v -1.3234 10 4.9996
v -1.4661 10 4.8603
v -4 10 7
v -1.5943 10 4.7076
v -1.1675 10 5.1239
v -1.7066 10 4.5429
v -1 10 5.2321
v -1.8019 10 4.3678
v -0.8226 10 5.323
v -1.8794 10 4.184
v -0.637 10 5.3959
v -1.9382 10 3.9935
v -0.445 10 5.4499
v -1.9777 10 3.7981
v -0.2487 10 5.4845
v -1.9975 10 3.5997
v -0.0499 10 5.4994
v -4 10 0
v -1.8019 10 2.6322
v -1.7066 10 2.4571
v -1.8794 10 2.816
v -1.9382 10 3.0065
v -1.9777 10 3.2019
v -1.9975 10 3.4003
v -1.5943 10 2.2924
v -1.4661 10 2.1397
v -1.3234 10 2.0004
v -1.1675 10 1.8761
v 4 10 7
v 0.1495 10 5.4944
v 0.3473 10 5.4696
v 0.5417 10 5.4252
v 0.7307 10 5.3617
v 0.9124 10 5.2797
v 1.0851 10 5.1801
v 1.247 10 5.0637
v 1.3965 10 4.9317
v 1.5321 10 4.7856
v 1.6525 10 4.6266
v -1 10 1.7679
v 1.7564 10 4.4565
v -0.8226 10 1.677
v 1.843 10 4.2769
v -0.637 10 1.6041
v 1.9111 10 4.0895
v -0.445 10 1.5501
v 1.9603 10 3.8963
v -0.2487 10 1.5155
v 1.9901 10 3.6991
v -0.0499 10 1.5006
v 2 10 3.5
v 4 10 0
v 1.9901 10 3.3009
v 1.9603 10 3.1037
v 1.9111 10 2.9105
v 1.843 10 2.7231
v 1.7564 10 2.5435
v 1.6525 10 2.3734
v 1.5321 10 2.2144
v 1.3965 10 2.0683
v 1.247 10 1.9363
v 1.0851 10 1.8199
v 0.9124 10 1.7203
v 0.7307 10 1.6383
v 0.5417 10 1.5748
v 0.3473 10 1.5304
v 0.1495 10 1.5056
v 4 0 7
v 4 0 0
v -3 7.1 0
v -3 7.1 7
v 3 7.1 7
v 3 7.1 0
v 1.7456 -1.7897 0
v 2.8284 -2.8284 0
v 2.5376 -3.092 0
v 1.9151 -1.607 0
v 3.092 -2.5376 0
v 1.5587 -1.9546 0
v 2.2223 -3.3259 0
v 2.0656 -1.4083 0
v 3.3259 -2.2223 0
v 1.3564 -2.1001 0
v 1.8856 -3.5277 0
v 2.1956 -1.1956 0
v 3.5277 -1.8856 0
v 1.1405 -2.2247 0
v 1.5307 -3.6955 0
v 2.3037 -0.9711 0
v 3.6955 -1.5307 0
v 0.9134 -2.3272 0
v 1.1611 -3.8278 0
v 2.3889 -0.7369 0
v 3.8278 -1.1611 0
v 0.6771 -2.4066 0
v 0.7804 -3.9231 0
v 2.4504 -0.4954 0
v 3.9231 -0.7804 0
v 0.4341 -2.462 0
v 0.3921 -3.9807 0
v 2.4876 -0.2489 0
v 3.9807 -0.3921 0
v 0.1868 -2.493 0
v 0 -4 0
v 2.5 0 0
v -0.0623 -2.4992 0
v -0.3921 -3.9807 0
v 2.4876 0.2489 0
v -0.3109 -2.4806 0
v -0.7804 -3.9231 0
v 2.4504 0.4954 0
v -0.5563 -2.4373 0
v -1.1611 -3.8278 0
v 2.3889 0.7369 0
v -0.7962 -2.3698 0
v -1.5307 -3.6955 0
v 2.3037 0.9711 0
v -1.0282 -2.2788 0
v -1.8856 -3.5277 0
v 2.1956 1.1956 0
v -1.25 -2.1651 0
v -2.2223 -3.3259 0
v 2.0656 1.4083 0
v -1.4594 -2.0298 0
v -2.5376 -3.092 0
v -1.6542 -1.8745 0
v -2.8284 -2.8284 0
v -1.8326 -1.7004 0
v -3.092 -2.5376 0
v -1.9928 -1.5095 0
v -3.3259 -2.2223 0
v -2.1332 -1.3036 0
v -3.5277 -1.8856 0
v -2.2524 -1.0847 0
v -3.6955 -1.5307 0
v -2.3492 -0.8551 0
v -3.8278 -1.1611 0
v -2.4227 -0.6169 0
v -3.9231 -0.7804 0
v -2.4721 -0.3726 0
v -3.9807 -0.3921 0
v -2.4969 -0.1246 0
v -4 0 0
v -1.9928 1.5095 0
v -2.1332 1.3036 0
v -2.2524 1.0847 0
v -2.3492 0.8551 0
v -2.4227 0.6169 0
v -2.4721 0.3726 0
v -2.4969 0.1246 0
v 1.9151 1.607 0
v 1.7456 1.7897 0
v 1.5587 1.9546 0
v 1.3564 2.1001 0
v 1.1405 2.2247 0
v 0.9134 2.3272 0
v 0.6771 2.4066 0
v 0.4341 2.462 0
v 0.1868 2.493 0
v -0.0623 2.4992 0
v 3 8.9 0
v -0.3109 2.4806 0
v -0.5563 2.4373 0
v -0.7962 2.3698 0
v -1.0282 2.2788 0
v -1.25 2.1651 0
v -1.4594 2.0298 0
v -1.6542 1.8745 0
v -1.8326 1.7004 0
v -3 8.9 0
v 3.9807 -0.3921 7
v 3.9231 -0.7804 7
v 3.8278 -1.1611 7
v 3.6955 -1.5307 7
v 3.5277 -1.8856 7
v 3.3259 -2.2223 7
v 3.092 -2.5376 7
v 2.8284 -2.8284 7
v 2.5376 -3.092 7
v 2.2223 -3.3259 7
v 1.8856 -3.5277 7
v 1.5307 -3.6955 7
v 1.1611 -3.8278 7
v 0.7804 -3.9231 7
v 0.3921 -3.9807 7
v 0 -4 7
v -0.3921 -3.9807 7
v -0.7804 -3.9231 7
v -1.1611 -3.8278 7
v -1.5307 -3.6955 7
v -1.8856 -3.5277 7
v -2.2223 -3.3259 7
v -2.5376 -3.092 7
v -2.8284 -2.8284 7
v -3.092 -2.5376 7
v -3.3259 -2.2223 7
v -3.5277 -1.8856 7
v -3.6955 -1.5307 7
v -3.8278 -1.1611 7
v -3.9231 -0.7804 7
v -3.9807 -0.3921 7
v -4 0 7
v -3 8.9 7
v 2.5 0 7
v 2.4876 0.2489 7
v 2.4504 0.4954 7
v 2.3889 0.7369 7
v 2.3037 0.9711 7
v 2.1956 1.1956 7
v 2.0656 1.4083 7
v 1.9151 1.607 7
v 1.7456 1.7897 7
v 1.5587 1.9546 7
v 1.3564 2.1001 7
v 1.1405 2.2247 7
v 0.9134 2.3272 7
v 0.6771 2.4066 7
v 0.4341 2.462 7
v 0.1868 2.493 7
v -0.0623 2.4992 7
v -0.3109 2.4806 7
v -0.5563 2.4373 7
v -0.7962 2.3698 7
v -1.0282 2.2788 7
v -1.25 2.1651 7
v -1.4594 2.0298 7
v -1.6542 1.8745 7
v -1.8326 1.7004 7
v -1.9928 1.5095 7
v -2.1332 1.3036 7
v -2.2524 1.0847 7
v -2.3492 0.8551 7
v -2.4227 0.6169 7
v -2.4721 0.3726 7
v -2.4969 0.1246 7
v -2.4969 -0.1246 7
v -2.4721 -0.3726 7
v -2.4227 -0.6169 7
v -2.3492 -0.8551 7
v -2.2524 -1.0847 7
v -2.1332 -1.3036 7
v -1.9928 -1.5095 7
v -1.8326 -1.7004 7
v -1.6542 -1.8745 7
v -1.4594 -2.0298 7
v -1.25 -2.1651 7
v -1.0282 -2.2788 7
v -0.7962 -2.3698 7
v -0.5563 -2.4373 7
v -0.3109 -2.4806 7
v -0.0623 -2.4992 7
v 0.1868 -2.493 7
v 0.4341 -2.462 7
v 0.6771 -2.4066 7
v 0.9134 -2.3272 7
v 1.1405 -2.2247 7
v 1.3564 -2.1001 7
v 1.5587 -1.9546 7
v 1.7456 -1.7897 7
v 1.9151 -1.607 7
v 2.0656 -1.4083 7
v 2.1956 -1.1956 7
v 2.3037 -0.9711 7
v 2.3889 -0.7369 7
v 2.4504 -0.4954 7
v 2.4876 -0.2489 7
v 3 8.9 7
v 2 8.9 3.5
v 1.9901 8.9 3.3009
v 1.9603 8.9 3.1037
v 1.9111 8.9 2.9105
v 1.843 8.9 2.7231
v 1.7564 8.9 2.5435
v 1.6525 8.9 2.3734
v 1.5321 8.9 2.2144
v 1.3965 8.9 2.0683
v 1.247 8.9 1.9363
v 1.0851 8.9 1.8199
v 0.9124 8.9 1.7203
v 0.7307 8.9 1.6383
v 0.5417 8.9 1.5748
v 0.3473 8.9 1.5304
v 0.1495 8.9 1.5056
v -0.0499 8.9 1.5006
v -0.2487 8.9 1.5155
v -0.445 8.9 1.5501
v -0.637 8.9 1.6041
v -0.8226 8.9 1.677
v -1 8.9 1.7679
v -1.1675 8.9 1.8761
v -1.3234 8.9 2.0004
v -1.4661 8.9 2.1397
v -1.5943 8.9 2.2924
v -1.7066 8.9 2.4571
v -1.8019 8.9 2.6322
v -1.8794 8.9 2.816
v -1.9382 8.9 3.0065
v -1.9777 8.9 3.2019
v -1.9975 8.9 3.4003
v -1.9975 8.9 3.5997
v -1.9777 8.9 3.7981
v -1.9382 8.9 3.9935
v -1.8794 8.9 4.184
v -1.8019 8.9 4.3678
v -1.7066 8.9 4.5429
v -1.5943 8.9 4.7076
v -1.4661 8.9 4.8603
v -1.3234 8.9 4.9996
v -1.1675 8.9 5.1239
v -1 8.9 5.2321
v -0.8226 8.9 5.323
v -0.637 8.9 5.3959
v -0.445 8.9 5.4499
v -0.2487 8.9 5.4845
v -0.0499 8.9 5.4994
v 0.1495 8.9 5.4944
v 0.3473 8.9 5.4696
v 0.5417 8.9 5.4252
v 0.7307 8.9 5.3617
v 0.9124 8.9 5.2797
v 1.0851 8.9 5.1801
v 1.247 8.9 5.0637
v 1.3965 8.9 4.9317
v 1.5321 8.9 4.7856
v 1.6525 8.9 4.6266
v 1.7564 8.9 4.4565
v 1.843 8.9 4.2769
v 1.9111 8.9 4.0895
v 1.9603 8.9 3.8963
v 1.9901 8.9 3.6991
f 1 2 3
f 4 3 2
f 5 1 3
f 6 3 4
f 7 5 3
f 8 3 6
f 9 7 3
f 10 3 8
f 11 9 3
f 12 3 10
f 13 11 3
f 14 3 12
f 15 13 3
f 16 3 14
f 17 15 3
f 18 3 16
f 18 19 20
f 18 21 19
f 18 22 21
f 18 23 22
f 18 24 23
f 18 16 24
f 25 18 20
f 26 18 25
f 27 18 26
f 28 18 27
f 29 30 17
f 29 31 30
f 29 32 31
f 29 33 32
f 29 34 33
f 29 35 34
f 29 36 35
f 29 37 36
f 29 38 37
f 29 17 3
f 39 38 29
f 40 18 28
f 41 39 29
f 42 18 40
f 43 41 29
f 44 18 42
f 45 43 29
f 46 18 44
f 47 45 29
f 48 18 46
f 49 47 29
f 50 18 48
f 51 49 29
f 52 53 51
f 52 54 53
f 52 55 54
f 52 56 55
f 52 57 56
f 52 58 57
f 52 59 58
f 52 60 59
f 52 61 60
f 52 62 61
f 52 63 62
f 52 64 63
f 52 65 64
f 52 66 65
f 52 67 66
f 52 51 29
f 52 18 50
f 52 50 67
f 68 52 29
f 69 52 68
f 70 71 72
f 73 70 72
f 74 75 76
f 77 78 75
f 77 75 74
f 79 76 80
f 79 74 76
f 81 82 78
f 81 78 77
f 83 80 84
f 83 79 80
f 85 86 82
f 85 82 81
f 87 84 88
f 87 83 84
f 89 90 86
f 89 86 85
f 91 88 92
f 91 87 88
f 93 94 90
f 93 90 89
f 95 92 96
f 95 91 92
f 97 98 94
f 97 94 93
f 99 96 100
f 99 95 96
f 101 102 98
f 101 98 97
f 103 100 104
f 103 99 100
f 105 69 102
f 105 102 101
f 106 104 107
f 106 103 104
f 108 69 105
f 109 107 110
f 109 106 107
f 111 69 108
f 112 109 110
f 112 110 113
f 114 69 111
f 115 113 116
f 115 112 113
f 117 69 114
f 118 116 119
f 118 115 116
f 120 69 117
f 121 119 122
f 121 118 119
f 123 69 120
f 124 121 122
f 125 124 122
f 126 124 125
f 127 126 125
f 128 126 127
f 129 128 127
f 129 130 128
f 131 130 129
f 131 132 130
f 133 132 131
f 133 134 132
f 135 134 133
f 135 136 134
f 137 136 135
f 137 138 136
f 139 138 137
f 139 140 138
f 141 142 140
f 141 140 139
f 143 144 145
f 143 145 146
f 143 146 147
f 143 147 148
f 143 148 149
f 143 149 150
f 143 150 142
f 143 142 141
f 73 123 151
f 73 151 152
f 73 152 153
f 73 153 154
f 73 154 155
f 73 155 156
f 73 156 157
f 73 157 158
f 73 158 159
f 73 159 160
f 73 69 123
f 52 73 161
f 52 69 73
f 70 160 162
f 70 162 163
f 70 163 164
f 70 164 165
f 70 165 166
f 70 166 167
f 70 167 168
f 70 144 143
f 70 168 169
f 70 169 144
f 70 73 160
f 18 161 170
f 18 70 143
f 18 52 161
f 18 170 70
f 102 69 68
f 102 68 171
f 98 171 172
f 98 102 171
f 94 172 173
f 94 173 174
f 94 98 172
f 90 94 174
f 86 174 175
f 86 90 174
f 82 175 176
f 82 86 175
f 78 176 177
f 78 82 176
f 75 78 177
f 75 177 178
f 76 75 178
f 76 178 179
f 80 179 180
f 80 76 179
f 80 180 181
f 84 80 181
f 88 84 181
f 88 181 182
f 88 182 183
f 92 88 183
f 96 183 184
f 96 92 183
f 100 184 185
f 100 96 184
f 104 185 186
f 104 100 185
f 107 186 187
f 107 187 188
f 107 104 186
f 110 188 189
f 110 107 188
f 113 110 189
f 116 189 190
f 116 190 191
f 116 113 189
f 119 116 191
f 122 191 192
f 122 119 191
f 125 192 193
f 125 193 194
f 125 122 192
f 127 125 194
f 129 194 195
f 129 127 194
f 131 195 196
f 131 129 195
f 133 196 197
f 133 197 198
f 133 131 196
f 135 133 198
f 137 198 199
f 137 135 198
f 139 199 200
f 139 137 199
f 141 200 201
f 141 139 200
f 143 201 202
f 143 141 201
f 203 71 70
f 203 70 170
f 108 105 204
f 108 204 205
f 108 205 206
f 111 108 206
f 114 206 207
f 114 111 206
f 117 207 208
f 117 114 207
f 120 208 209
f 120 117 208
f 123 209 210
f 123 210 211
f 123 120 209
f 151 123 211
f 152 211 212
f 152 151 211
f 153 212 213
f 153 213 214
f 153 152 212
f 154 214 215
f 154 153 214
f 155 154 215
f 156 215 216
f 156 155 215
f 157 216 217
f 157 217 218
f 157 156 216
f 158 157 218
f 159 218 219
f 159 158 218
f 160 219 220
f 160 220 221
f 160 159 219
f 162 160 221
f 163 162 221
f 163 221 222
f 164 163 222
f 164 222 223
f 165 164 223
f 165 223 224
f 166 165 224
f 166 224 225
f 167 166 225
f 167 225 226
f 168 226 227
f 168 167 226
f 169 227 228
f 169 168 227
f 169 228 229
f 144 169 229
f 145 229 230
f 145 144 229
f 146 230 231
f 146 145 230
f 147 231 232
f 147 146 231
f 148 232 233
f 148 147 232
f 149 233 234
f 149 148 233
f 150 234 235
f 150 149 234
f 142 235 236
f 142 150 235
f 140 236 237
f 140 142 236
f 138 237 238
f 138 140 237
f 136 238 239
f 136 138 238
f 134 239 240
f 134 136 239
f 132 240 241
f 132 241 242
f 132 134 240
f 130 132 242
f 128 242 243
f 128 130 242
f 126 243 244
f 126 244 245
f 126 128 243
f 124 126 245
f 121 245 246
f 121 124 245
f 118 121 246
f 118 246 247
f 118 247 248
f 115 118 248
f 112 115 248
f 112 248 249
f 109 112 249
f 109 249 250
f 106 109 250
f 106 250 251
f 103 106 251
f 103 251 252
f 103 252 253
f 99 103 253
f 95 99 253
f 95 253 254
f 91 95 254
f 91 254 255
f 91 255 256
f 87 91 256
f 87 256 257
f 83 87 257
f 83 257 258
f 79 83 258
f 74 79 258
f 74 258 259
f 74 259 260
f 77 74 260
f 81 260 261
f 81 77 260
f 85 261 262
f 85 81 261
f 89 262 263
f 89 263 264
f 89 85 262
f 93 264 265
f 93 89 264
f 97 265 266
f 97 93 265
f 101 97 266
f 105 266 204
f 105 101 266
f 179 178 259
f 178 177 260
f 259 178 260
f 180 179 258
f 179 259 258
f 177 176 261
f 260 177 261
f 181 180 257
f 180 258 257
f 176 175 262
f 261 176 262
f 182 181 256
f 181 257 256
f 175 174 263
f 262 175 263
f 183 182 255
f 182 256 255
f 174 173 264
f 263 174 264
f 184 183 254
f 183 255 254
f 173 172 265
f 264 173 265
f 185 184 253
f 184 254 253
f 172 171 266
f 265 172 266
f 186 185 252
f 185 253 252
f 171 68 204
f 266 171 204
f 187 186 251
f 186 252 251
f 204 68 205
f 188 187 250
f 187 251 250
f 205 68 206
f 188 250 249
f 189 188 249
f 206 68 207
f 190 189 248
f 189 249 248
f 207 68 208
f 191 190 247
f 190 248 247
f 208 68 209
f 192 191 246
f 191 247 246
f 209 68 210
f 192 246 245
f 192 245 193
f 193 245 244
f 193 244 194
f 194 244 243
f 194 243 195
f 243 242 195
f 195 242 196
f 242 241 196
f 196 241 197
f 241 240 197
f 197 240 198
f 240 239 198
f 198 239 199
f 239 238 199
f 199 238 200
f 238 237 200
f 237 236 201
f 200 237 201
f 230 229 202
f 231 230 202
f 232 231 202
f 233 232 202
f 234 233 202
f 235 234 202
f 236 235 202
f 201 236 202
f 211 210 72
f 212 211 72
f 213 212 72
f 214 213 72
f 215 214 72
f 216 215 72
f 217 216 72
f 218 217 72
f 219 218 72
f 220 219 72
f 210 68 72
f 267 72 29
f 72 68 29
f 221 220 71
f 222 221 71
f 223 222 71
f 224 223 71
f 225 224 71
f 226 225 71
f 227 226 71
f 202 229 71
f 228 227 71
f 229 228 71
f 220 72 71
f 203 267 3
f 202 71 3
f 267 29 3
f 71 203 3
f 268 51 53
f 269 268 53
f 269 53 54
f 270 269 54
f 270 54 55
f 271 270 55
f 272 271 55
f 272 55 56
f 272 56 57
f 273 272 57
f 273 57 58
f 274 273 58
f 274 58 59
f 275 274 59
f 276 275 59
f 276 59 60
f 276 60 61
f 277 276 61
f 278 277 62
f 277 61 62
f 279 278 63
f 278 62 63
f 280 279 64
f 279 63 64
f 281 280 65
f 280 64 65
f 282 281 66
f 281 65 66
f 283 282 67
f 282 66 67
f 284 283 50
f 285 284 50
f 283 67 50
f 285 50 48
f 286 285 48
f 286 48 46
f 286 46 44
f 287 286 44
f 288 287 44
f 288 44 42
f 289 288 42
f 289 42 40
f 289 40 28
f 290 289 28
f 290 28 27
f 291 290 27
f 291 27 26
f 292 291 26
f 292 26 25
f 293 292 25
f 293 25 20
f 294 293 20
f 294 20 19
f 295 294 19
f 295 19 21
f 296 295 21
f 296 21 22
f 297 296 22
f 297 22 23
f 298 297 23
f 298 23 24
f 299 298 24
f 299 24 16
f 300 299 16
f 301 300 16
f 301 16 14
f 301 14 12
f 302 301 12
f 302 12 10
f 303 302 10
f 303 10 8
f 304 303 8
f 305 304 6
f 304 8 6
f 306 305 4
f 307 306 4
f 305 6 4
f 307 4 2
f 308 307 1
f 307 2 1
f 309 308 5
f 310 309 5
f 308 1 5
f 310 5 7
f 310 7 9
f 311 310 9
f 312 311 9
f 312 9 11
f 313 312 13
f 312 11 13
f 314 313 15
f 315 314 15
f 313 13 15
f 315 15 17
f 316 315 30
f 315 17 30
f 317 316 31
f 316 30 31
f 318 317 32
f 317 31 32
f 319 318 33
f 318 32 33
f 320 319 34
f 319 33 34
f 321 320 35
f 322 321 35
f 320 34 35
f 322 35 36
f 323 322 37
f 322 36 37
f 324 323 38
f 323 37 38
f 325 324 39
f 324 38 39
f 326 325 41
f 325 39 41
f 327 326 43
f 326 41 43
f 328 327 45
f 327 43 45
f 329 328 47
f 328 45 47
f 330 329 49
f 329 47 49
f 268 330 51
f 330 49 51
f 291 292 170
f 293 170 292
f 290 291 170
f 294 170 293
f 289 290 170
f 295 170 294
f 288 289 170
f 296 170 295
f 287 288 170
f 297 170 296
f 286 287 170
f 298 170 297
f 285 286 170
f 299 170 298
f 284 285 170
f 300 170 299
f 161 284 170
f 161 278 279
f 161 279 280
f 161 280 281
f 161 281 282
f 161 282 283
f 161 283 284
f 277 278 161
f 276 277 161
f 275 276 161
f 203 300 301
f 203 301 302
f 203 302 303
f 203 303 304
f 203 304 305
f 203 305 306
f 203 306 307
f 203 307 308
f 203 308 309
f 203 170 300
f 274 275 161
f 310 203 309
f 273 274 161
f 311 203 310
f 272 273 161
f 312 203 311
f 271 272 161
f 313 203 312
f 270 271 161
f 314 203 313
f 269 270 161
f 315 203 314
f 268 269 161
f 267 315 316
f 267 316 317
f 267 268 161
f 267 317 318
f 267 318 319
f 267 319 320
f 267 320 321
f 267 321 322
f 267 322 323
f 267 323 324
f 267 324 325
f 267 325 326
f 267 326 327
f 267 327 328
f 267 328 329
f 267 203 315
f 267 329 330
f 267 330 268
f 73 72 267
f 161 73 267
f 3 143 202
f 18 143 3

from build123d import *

# Parameters (mm, degrees)
SKETCH2_R           = 2.5
BOSS_EXTRUDE1_DEPTH = 7
SKETCH3_W           = 6
SKETCH3_H           = 1.8
CUT_EXTRUDE1_DEPTH  = 7
SKETCH4_R           = 2
CUT_EXTRUDE2_DEPTH  = 2


with BuildPart() as part:
    # Sketch2 → Boss-Extrude1 (new body)
    with BuildSketch(Plane.XY):
        with BuildLine():
            Line((-4, 0), (-4, 10))
            Line((-4, 10), (4, 10))
            Line((4, 10), (4, 0))
            ThreePointArc((4, 0), (0, -4), (-4, 0))
        make_face()
        Circle(SKETCH2_R, mode=Mode.SUBTRACT)
    extrude(amount=BOSS_EXTRUDE1_DEPTH)

    # Sketch3 → Cut-Extrude1 (cut)
    with BuildSketch(Plane.XY.offset(7)):
        with Locations((0, 8)):
            Rectangle(SKETCH3_W, SKETCH3_H)
    extrude(amount=-CUT_EXTRUDE1_DEPTH, mode=Mode.SUBTRACT)

    # Sketch4 → Cut-Extrude2 (cut)
    with BuildSketch(Plane(origin=(0, 10, 0), x_dir=(1, 0, 0), z_dir=(0, 1, 0))):
        with Locations((0, -3.5)):
            Circle(SKETCH4_R)
    extrude(amount=-CUT_EXTRUDE2_DEPTH, mode=Mode.SUBTRACT)


solid = part.part
